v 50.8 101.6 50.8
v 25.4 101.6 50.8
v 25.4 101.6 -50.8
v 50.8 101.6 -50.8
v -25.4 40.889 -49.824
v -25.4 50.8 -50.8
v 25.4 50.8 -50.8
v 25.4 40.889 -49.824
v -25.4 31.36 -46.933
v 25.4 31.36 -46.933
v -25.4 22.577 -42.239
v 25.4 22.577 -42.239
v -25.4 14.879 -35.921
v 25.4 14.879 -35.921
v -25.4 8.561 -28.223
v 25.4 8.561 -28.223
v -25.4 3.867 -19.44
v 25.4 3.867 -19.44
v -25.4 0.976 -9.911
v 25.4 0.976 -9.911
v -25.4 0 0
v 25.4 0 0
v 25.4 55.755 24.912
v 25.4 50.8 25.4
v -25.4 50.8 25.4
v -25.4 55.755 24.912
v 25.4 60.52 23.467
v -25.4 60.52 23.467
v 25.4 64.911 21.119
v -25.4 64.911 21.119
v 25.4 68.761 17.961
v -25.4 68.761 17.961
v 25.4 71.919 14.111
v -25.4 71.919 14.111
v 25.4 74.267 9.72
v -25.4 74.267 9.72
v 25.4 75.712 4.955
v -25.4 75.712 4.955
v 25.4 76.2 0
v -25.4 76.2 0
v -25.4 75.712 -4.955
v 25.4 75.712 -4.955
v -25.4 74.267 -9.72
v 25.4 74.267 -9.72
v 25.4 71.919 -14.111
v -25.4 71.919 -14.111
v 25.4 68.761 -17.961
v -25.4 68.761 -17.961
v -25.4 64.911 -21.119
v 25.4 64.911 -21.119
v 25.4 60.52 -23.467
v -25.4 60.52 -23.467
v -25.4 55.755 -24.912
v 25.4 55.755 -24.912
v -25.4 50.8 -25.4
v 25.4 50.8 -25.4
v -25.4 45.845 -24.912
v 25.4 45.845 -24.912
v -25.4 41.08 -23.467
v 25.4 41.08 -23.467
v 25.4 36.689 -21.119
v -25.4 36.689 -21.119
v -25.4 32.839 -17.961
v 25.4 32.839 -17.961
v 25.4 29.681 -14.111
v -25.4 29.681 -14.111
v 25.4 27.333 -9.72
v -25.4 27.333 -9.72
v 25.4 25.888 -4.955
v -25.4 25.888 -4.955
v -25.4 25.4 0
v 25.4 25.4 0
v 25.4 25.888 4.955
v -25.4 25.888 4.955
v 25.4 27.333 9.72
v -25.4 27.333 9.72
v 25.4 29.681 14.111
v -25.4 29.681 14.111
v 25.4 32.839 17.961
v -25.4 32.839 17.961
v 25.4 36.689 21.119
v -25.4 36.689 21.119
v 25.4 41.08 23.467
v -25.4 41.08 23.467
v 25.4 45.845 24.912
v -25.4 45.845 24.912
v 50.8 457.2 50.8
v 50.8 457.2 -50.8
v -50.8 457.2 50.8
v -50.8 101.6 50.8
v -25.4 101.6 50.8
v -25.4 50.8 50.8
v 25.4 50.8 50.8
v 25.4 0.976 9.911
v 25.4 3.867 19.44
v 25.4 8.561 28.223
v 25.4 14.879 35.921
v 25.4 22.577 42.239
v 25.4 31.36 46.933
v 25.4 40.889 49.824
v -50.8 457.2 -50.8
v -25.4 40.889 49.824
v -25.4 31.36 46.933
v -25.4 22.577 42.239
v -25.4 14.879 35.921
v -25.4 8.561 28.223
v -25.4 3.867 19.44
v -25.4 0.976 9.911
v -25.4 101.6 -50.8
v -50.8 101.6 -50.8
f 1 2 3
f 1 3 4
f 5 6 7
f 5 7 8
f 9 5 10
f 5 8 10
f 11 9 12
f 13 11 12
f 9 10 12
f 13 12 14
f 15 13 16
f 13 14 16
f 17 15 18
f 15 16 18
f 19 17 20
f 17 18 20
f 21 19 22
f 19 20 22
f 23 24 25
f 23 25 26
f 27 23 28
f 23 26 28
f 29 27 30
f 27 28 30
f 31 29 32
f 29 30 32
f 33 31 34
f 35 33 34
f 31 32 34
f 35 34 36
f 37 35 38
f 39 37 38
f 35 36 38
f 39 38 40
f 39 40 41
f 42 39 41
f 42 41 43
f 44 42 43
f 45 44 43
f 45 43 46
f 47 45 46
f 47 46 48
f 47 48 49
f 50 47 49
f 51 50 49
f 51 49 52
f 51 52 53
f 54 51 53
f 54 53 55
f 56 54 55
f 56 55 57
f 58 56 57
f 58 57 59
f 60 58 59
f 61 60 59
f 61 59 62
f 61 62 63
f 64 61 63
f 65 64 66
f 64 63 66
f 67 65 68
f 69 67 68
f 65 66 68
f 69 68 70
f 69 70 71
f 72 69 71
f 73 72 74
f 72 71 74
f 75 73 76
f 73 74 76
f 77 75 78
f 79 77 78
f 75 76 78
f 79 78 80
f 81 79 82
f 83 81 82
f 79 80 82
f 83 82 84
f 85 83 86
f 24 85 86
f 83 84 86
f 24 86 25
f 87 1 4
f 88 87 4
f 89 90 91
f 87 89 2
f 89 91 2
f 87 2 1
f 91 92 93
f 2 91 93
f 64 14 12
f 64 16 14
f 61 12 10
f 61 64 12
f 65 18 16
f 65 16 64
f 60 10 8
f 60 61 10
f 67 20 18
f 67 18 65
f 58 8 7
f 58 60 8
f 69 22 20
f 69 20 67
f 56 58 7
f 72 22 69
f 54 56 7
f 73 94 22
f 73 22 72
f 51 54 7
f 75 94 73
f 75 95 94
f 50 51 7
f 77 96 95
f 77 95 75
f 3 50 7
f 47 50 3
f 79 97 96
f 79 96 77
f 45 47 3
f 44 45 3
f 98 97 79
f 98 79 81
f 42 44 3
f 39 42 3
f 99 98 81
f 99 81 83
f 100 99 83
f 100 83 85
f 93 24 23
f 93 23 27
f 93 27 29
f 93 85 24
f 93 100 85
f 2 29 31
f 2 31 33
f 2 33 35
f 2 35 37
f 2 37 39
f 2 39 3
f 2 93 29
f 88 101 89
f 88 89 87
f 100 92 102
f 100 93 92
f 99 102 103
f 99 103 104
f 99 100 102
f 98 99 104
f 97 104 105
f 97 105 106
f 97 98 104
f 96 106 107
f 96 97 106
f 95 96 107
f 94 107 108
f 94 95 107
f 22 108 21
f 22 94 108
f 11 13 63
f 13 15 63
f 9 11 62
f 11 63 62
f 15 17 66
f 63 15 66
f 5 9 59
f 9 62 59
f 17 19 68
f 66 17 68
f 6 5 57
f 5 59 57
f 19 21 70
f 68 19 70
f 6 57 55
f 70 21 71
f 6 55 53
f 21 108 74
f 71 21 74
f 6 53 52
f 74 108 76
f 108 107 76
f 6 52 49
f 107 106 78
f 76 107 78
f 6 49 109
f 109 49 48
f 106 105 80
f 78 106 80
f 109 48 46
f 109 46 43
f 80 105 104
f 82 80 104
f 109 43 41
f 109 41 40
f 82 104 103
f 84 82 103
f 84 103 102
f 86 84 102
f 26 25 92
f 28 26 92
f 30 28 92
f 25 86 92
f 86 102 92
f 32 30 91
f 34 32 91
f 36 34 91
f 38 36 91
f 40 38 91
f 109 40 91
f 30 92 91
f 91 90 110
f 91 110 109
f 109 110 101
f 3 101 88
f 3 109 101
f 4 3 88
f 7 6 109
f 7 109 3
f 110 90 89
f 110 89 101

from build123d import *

# Parameters (mm, degrees)
SKETCH1_W           = 101.6
SKETCH1_H           = 101.6
BOSS_EXTRUDE1_DEPTH = 457.2
SKETCH2_W           = 25.4
SKETCH2_H           = 101.6
CUT_EXTRUDE1_DEPTH  = 472.099819571
FILLET1_R           = 50.8
SKETCH3_R           = 25.4
CUT_EXTRUDE2_DEPTH  = 467.282017667


with BuildPart() as part:
    # Sketch1 → Boss-Extrude1 (new body)
    with BuildSketch(Plane(origin=(0, 0, 0), x_dir=(1, 0, 0), z_dir=(0, 1, 0))):
        Rectangle(SKETCH1_W, SKETCH1_H)
    extrude(amount=BOSS_EXTRUDE1_DEPTH)

    # Sketch2 → Cut-Extrude1 (cut, through all)
    with BuildSketch(Plane.XY.offset(50.8)):
        with Locations((-38.1, 50.8)):
            Rectangle(SKETCH2_W, SKETCH2_H)
        with Locations((38.1, 50.8)):
            Rectangle(SKETCH2_W, SKETCH2_H)
    extrude(amount=-CUT_EXTRUDE1_DEPTH, mode=Mode.SUBTRACT)

    # Fillet1
    fillet1_edges = [part.edges().sort_by_distance(p)[0] for p in [
        (0, 0, -50.8),
        (0, 0, 50.8),
    ]]
    fillet(fillet1_edges, radius=FILLET1_R - 0.0001)  # a hair under: the kernel refuses the full size

    # Sketch3 → Cut-Extrude2 (cut, through all)
    with BuildSketch(Plane.ZY.offset(25.4)):
        with Locations((0, 50.8)):
            Circle(SKETCH3_R)
    extrude(amount=-CUT_EXTRUDE2_DEPTH, mode=Mode.SUBTRACT)


solid = part.part
